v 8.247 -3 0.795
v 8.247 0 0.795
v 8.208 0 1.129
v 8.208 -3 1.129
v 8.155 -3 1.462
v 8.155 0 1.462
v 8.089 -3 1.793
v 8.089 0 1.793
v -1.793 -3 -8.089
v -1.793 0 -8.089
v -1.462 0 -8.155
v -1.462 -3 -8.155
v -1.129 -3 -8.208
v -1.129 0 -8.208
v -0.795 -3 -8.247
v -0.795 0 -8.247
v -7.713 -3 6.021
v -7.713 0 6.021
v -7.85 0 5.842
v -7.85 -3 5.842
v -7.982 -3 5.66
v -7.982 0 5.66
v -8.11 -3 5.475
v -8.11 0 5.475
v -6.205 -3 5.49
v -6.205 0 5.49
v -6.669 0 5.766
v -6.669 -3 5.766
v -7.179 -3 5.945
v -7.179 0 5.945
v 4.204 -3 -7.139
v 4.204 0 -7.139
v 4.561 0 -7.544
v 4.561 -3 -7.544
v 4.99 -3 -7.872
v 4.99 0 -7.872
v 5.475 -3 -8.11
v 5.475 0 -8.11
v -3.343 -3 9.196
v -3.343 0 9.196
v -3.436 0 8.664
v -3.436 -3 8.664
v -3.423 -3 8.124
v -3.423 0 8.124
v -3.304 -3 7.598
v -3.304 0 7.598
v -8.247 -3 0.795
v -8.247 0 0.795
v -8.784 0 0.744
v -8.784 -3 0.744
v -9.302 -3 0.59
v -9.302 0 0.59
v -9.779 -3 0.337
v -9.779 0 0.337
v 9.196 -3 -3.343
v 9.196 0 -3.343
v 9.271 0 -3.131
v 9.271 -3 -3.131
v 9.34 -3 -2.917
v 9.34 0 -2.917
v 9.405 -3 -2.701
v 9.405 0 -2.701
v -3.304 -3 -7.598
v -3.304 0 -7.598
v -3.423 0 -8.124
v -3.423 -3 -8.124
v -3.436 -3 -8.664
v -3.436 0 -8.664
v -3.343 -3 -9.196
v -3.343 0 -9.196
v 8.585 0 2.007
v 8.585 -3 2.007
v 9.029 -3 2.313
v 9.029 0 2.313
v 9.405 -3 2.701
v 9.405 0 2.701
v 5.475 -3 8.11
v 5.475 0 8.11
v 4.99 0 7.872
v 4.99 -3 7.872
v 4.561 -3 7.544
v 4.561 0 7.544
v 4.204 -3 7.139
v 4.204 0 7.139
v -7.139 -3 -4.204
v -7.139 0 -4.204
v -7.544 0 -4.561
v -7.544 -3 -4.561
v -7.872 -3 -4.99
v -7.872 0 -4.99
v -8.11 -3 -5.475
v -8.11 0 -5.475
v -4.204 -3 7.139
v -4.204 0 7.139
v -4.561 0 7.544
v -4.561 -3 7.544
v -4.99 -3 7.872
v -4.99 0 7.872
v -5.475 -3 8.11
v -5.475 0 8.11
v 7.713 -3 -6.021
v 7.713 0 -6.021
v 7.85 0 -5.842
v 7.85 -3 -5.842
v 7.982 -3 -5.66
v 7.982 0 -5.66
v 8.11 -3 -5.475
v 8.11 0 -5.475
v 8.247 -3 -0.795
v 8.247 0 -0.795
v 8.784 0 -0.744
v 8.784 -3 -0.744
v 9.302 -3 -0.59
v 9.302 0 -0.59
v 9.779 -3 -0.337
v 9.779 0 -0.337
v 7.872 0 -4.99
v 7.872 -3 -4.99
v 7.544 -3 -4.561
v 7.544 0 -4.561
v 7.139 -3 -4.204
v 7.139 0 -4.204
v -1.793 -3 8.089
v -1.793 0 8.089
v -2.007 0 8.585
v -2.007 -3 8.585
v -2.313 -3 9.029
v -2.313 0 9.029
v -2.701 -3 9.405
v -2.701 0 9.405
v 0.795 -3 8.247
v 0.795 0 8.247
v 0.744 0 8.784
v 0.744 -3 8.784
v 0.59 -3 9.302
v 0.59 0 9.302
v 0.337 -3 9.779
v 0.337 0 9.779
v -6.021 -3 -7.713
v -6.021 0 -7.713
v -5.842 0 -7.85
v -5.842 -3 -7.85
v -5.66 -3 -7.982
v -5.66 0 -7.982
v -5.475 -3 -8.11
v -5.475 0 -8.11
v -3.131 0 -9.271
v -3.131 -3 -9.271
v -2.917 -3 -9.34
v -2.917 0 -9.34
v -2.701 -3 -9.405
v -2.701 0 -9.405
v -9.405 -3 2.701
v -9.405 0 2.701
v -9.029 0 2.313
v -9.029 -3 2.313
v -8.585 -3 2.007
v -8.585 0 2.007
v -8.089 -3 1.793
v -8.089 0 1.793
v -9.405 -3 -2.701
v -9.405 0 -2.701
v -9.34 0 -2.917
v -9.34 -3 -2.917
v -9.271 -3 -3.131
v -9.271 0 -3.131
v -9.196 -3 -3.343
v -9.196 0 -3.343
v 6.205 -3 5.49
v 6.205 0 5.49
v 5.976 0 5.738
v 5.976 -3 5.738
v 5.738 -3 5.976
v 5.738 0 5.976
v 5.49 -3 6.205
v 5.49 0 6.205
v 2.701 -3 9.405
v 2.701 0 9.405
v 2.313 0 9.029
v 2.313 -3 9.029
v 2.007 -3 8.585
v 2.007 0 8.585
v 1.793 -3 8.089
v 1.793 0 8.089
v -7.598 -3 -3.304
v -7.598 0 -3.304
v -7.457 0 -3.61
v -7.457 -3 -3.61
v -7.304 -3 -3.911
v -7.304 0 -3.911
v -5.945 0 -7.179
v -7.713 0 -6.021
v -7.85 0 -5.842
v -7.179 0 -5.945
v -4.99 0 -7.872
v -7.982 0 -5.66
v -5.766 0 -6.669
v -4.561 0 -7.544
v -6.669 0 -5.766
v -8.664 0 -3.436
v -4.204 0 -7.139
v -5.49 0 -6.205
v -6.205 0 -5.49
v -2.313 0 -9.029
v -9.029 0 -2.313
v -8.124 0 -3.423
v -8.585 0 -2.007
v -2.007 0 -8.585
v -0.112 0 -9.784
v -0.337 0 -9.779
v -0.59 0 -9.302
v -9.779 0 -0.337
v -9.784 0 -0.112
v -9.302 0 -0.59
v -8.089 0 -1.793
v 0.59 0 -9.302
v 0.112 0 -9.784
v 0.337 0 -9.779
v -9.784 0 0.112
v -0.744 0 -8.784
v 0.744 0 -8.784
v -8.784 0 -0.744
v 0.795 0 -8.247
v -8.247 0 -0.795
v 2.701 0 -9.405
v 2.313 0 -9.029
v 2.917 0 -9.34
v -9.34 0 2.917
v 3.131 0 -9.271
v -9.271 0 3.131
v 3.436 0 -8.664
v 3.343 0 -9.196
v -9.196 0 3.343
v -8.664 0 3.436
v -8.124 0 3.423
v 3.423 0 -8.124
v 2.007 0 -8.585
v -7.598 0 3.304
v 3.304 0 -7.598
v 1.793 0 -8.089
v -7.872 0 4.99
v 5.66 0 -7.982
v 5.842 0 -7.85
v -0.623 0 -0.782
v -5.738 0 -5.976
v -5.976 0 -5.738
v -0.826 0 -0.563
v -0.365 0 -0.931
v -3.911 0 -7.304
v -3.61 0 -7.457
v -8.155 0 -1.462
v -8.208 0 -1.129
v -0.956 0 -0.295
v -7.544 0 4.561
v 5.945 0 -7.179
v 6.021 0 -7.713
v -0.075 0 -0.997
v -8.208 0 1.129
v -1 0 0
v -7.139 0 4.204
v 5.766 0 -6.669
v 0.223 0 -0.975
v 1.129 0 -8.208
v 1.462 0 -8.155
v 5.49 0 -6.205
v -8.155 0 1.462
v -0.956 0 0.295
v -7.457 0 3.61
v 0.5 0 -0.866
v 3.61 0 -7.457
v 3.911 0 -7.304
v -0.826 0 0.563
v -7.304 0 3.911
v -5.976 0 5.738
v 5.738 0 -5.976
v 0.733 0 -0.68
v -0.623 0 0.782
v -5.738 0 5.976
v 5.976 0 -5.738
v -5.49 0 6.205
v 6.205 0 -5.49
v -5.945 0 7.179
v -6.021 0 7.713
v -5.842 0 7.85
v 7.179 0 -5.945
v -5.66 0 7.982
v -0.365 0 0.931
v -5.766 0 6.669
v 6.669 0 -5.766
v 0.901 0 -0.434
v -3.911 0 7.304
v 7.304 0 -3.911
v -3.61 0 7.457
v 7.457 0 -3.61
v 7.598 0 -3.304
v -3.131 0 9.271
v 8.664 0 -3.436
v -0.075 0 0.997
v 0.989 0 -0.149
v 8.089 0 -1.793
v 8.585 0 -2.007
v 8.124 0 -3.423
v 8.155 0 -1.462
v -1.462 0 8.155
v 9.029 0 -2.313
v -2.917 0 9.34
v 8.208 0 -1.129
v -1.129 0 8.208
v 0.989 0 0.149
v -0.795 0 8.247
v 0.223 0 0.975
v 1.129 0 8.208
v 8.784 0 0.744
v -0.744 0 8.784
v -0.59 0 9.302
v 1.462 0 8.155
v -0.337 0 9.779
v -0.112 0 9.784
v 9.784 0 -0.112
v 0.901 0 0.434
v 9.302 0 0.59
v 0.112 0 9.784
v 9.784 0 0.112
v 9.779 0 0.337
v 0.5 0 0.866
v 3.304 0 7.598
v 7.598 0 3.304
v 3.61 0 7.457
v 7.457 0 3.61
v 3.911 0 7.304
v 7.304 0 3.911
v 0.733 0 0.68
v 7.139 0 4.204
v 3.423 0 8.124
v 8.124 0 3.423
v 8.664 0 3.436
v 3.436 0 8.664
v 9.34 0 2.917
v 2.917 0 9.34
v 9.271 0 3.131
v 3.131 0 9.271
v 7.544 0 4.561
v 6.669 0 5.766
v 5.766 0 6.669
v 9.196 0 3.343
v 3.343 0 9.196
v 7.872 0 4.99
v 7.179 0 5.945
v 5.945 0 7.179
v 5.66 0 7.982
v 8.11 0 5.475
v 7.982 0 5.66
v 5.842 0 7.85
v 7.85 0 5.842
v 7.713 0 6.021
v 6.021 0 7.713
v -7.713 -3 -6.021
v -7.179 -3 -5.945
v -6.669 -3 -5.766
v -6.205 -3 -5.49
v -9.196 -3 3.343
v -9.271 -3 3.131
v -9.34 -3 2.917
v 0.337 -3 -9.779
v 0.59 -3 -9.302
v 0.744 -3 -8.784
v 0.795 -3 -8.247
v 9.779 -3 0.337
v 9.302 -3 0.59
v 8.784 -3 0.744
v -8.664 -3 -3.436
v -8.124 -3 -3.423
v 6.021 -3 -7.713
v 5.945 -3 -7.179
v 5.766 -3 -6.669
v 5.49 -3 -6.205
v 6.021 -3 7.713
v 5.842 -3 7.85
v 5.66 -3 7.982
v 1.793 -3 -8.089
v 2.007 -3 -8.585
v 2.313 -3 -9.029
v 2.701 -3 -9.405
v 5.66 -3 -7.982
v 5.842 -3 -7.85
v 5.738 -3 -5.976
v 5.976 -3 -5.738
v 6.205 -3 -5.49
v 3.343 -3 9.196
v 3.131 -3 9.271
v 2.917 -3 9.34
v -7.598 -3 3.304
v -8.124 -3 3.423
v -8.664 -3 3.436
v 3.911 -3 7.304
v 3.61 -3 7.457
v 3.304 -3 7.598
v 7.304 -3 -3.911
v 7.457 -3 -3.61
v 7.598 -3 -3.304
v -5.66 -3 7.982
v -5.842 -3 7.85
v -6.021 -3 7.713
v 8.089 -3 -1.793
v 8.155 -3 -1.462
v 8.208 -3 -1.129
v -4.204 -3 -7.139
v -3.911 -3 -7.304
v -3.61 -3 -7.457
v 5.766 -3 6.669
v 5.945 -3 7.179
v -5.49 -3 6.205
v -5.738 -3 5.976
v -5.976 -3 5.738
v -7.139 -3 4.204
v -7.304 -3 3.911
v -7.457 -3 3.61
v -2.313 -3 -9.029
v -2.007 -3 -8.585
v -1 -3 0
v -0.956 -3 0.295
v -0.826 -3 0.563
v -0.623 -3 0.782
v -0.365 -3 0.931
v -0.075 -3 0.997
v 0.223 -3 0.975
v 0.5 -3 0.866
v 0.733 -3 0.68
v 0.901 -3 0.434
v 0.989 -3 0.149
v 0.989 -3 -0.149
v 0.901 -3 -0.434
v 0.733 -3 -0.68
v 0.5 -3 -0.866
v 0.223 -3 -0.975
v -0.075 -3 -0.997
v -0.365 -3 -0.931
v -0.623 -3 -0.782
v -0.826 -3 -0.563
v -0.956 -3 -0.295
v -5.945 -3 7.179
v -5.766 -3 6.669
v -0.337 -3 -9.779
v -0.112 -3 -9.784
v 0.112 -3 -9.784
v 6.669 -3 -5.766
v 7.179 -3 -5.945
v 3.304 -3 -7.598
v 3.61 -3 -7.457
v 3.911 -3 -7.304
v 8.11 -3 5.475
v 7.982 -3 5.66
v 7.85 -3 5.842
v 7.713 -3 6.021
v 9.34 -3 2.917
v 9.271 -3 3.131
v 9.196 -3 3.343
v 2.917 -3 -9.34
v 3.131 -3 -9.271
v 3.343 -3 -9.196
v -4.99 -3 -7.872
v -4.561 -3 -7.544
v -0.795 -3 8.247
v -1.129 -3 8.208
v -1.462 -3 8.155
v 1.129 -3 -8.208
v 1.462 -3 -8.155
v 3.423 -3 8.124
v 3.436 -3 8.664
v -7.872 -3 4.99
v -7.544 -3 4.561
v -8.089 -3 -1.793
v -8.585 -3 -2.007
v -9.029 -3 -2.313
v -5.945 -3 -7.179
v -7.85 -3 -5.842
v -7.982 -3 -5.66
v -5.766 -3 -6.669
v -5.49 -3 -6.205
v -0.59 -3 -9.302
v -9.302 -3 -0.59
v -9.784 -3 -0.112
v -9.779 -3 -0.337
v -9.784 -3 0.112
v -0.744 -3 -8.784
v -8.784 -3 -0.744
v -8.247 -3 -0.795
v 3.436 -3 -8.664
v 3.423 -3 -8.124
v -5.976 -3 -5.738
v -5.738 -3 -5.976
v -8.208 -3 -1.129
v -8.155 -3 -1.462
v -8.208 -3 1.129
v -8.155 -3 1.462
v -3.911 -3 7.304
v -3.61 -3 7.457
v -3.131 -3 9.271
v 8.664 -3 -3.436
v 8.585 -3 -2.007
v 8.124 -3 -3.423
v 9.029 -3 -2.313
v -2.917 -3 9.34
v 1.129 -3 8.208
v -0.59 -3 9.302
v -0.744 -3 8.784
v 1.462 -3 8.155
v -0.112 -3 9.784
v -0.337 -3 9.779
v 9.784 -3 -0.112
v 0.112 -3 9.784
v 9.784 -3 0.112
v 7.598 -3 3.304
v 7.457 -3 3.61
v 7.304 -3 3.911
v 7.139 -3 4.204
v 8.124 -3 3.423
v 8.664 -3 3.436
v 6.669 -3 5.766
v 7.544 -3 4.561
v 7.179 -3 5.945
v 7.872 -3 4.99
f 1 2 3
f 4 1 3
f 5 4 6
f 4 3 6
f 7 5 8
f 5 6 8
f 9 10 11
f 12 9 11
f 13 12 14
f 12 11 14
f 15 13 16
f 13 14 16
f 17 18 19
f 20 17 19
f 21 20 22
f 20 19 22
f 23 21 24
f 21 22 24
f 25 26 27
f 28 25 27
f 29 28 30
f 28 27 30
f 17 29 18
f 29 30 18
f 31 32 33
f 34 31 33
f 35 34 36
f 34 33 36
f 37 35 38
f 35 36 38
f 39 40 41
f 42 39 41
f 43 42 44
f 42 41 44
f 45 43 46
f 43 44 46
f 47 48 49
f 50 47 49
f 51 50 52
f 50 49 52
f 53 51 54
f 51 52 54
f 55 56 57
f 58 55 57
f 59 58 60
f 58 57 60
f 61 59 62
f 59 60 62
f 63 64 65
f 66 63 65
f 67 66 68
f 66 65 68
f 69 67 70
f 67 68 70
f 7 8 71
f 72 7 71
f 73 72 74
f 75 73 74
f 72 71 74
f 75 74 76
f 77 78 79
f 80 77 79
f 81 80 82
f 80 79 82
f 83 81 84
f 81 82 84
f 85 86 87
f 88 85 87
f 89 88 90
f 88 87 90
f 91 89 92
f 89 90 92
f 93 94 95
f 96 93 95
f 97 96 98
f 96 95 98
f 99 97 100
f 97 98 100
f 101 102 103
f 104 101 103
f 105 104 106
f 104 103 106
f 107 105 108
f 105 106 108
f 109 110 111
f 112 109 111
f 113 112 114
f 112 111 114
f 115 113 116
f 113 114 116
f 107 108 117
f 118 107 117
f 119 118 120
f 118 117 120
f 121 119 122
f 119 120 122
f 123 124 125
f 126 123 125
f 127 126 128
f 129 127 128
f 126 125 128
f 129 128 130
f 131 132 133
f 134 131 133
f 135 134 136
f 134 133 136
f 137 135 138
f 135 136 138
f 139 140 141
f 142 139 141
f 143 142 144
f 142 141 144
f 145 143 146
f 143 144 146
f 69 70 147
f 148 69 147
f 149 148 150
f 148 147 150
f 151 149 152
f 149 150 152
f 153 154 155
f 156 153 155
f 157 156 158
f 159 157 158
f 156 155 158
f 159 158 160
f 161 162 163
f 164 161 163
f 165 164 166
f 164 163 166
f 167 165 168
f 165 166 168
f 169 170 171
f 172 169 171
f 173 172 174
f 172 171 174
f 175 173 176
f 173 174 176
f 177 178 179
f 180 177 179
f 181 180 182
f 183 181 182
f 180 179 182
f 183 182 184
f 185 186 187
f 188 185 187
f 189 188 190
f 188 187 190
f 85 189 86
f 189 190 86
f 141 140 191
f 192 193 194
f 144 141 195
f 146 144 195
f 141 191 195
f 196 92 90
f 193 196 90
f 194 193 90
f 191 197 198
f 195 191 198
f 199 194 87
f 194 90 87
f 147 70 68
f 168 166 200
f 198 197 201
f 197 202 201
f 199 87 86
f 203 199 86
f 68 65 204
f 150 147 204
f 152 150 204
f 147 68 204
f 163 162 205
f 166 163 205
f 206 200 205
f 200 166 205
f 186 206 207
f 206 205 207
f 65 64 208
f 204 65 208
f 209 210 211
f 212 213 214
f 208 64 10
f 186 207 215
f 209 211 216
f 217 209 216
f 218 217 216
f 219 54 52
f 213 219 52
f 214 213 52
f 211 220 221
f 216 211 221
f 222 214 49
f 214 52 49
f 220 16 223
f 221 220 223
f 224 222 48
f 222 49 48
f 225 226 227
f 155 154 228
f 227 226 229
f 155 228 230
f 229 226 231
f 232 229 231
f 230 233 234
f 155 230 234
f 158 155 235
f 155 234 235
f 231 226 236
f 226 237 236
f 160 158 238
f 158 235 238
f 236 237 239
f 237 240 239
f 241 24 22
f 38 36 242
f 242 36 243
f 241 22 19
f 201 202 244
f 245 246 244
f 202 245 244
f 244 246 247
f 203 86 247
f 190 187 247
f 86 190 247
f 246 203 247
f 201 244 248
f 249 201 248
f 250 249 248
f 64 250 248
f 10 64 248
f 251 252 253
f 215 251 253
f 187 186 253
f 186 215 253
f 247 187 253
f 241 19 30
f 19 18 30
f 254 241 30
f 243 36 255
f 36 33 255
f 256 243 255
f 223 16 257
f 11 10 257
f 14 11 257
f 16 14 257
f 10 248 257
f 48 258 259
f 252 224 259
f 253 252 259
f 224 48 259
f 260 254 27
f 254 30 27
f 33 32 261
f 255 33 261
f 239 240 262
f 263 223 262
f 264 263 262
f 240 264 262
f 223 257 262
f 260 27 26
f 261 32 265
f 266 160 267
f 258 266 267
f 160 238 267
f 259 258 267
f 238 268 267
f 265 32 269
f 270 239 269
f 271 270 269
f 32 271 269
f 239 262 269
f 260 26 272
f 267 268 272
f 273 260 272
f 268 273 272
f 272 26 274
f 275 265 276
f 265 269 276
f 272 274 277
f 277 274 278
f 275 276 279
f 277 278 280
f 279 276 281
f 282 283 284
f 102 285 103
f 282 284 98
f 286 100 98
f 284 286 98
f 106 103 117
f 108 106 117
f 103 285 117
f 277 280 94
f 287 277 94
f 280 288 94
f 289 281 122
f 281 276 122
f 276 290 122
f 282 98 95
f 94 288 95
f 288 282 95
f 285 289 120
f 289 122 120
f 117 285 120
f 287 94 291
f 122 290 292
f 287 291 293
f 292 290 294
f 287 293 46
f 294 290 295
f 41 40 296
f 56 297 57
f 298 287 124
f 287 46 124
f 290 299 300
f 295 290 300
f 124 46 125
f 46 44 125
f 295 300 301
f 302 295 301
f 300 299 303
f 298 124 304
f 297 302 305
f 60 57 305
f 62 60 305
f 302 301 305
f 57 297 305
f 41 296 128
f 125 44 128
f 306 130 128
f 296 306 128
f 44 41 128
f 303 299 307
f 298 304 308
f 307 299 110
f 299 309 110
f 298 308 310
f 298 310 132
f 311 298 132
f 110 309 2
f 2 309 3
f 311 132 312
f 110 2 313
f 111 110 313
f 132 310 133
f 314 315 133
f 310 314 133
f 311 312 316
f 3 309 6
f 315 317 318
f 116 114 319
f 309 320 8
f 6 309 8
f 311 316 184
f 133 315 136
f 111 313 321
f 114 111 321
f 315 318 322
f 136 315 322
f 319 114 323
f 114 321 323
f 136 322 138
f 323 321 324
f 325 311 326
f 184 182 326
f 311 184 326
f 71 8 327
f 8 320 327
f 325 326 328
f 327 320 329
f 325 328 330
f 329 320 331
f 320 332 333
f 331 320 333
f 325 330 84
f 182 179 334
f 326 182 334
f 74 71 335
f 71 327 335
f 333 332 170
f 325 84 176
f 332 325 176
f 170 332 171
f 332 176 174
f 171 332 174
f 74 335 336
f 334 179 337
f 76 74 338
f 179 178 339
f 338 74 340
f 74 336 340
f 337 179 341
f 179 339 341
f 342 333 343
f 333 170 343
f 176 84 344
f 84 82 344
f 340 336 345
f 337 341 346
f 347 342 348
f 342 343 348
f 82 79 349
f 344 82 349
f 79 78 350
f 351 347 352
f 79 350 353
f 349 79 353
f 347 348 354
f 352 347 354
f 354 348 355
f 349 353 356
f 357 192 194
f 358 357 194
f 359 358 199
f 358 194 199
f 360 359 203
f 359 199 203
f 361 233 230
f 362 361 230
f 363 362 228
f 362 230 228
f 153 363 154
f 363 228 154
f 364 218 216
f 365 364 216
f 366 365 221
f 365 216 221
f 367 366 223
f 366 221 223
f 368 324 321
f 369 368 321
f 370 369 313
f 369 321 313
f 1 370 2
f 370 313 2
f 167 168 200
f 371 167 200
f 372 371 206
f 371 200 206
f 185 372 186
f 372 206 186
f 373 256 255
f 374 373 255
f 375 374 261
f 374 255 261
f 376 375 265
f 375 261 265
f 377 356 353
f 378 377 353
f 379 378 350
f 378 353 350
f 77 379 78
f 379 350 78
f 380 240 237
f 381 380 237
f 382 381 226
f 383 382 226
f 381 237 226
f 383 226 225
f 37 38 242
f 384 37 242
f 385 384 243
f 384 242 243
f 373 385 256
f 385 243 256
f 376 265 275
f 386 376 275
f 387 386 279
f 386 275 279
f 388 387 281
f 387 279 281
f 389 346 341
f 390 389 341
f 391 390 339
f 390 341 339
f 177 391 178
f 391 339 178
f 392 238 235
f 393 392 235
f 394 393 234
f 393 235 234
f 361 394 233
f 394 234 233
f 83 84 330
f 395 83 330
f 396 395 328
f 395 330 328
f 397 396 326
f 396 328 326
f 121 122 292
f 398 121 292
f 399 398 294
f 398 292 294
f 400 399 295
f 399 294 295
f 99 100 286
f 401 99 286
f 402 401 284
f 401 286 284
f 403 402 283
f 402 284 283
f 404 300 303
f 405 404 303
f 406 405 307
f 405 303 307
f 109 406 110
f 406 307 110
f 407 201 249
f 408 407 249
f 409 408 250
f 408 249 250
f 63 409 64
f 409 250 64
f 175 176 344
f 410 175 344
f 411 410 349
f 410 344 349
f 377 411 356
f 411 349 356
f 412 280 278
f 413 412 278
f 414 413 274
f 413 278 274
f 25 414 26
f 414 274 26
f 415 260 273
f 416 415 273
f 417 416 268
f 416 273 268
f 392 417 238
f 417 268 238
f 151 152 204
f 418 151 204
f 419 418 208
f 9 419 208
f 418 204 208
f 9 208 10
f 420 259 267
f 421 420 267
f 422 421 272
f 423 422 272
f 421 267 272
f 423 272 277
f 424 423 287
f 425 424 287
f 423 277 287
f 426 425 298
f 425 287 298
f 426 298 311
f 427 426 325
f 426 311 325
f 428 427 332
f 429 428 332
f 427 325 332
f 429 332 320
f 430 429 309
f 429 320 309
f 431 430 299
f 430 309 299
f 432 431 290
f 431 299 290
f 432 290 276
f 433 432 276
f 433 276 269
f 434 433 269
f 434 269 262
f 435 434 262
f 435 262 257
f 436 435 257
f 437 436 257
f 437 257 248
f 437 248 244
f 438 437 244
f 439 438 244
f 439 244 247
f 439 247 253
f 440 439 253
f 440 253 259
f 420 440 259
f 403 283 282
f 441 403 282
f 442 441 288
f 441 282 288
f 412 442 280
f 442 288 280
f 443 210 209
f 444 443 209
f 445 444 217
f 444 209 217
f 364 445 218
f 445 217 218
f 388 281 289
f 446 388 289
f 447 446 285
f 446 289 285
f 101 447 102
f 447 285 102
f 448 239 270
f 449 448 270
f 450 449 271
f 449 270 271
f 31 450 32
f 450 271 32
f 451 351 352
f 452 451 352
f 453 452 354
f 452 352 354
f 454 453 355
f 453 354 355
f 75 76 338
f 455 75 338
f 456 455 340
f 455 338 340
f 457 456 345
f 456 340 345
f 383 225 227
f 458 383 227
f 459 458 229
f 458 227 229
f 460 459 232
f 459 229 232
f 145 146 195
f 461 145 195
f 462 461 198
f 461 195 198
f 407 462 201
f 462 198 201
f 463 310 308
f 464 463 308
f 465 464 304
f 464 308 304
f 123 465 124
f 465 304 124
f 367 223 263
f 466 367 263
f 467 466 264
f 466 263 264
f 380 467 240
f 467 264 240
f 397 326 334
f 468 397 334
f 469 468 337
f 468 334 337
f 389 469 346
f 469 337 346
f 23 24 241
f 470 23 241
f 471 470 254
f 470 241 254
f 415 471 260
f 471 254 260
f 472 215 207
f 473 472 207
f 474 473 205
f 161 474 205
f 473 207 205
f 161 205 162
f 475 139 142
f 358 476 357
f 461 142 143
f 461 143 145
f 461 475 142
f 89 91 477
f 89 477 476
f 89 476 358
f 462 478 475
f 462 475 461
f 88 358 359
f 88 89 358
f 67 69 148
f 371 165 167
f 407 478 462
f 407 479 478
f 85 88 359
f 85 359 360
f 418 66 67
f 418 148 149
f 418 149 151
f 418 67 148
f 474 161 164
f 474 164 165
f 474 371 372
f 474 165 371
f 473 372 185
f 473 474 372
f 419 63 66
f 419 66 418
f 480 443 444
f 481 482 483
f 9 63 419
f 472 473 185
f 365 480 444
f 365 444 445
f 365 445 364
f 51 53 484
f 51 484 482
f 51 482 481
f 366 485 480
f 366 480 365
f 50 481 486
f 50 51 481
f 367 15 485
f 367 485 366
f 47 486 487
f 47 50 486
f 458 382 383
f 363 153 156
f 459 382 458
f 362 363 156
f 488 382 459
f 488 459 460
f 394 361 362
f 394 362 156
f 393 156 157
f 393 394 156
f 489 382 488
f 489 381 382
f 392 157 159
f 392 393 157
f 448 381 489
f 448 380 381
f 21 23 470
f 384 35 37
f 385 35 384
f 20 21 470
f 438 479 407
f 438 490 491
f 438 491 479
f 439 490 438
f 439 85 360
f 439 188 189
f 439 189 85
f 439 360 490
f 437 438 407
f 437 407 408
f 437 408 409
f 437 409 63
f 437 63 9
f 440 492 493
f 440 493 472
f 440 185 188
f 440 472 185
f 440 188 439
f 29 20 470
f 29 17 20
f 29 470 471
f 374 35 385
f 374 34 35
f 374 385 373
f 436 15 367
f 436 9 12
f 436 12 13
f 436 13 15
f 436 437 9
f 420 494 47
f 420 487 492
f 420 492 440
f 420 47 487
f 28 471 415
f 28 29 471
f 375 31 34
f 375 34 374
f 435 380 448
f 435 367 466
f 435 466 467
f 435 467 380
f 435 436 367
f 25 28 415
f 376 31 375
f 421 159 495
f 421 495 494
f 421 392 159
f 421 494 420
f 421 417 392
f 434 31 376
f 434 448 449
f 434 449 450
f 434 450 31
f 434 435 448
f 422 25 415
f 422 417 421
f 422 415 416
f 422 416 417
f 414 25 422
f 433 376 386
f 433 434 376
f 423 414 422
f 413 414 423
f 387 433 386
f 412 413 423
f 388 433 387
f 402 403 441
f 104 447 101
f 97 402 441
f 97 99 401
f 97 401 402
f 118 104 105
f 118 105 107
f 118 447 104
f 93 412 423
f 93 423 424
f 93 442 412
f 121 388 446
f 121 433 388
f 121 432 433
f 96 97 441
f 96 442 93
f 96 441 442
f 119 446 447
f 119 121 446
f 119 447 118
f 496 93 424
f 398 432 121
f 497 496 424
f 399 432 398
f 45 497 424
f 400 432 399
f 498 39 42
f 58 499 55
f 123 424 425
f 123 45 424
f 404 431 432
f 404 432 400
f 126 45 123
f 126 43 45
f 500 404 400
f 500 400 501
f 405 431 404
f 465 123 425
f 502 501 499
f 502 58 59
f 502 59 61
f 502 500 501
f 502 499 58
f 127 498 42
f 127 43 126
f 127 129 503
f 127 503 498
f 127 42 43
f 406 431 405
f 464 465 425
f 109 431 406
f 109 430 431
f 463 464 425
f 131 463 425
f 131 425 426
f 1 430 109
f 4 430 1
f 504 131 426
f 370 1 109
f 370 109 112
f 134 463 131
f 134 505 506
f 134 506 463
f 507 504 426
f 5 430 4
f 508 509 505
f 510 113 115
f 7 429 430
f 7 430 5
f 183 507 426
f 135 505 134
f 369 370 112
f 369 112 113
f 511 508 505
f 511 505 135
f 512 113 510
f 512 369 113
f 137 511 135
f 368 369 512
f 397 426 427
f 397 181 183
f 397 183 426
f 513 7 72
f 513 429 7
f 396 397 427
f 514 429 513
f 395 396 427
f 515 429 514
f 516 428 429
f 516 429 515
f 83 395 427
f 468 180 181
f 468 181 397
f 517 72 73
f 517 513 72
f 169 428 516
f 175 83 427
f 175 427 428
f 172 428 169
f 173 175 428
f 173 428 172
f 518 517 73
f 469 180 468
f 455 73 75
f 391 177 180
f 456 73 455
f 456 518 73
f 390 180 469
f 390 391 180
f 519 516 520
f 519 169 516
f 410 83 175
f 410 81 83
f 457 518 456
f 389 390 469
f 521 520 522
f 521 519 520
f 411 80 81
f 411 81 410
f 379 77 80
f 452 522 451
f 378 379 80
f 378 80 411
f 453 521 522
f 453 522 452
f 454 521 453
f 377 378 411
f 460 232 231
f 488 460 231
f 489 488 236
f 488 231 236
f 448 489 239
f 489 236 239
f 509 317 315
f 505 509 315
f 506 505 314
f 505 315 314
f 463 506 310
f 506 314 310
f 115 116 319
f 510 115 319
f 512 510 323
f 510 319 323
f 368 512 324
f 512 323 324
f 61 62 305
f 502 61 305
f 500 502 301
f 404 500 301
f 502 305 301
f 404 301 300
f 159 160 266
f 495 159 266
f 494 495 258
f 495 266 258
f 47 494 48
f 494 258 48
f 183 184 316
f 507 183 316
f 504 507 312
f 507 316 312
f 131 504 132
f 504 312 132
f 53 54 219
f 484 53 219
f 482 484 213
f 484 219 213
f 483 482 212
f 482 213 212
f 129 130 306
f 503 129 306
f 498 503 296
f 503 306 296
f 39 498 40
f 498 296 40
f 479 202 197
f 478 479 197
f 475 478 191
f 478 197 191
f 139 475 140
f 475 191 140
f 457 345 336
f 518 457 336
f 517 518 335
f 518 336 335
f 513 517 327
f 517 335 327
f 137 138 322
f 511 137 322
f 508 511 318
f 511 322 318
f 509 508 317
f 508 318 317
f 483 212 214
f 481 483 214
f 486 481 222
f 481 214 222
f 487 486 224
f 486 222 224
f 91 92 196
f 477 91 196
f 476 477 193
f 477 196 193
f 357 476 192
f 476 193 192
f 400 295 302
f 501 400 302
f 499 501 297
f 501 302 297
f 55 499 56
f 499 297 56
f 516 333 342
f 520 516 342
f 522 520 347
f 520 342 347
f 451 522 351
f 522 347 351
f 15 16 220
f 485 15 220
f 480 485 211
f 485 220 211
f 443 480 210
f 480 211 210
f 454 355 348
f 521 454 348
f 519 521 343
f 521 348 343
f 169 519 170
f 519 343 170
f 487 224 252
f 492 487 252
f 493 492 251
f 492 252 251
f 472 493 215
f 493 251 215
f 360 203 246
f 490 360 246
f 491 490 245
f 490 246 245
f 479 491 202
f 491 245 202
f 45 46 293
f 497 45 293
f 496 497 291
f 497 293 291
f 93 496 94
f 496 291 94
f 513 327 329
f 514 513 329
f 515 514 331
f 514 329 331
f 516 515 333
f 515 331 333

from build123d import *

# Parameters (mm, degrees)
F1_DEPTH = 3
F2_R     = 1
F3_DEPTH = 3.001


with BuildPart() as f1:
    # F0 (on Front) → F1 (new body)
    with BuildSketch(Plane.XZ):
        with BuildLine():
            ThreePointArc((8.24679, -0.794783), (8.275442, -0.397851), (8.285, 0))
            ThreePointArc((8.285, 0), (8.275442, 0.397851), (8.24679, 0.794783))
            ThreePointArc((8.24679, 0.794783), (8.182998, 1.29606), (8.088765, 1.792514))
            ThreePointArc((8.088765, 1.792514), (7.879503, 2.560206), (7.597562, 3.304282))
            ThreePointArc((7.597562, 3.304282), (7.381989, 3.761311), (7.138955, 4.204348))
            ThreePointArc((7.138955, 4.204348), (6.702706, 4.869801), (6.204631, 5.490335))
            ThreePointArc((6.204631, 5.490335), (5.85838, 5.85838), (5.490335, 6.204631))
            ThreePointArc((5.490335, 6.204631), (4.869801, 6.702706), (4.204348, 7.138955))
            ThreePointArc((4.204348, 7.138955), (3.761311, 7.381989), (3.304282, 7.597562))
            ThreePointArc((3.304282, 7.597562), (2.560206, 7.879503), (1.792514, 8.088765))
            ThreePointArc((1.792514, 8.088765), (1.29606, 8.182998), (0.794783, 8.24679))
            ThreePointArc((0.794783, 8.24679), (0, 8.285), (-0.794783, 8.24679))
            ThreePointArc((-0.794783, 8.24679), (-1.29606, 8.182998), (-1.792514, 8.088765))
            ThreePointArc((-1.792514, 8.088765), (-2.560206, 7.879503), (-3.304282, 7.597562))
            ThreePointArc((-3.304282, 7.597562), (-3.761311, 7.381989), (-4.204348, 7.138955))
            ThreePointArc((-4.204348, 7.138955), (-4.869801, 6.702706), (-5.490335, 6.204631))
            ThreePointArc((-5.490335, 6.204631), (-5.85838, 5.85838), (-6.204631, 5.490335))
            ThreePointArc((-6.204631, 5.490335), (-6.702706, 4.869801), (-7.138955, 4.204348))
            ThreePointArc((-7.138955, 4.204348), (-7.381989, 3.761311), (-7.597562, 3.304282))
            ThreePointArc((-7.597562, 3.304282), (-7.879503, 2.560206), (-8.088765, 1.792514))
            ThreePointArc((-8.088765, 1.792514), (-8.182998, 1.29606), (-8.24679, 0.794783))
            ThreePointArc((-8.24679, 0.794783), (-8.285, 0), (-8.24679, -0.794783))
            ThreePointArc((-8.24679, -0.794783), (-8.182998, -1.29606), (-8.088765, -1.792514))
            ThreePointArc((-8.088765, -1.792514), (-7.879503, -2.560206), (-7.597562, -3.304282))
            ThreePointArc((-7.597562, -3.304282), (-7.381989, -3.761311), (-7.138955, -4.204348))
            ThreePointArc((-7.138955, -4.204348), (-6.702706, -4.869801), (-6.204631, -5.490335))
            ThreePointArc((-6.204631, -5.490335), (-5.85838, -5.85838), (-5.490335, -6.204631))
            ThreePointArc((-5.490335, -6.204631), (-4.869801, -6.702706), (-4.204348, -7.138955))
            ThreePointArc((-4.204348, -7.138955), (-3.761311, -7.381989), (-3.304282, -7.597562))
            ThreePointArc((-3.304282, -7.597562), (-2.560206, -7.879503), (-1.792514, -8.088765))
            ThreePointArc((-1.792514, -8.088765), (-1.29606, -8.182998), (-0.794783, -8.24679))
            ThreePointArc((-0.794783, -8.24679), (0, -8.285), (0.794783, -8.24679))
            ThreePointArc((0.794783, -8.24679), (1.29606, -8.182998), (1.792514, -8.088765))
            ThreePointArc((1.792514, -8.088765), (2.560206, -7.879503), (3.304282, -7.597562))
            ThreePointArc((3.304282, -7.597562), (3.761311, -7.381989), (4.204348, -7.138955))
            ThreePointArc((4.204348, -7.138955), (4.869801, -6.702706), (5.490335, -6.204631))
            ThreePointArc((5.490335, -6.204631), (5.85838, -5.85838), (6.204631, -5.490335))
            ThreePointArc((6.204631, -5.490335), (6.702706, -4.869801), (7.138955, -4.204348))
            ThreePointArc((7.138955, -4.204348), (7.381989, -3.761311), (7.597562, -3.304282))
            ThreePointArc((7.597562, -3.304282), (7.879503, -2.560206), (8.088765, -1.792514))
            ThreePointArc((8.088765, -1.792514), (8.182998, -1.29606), (8.24679, -0.794783))
        make_face()
        with BuildLine():
            ThreePointArc((8.24679, 0.794783), (8.275442, 0.397851), (8.285, 0))
            ThreePointArc((8.285, 0), (8.275442, -0.397851), (8.24679, -0.794783))
            ThreePointArc((8.24679, -0.794783), (9.046963, -0.679903), (9.779182, -0.33737))
            ThreePointArc((9.779182, -0.33737), (9.785, 0), (9.779182, 0.33737))
            ThreePointArc((9.779182, 0.33737), (9.046963, 0.679903), (8.24679, 0.794783))
        make_face()
        with BuildLine():
            ThreePointArc((7.597562, 3.304282), (7.879503, 2.560206), (8.088765, 1.792514))
            ThreePointArc((8.088765, 1.792514), (8.814274, 2.149039), (9.404808, 2.701076))
            ThreePointArc((9.404808, 2.701076), (9.306088, 3.023731), (9.196302, 3.342791))
            ThreePointArc((9.196302, 3.342791), (8.394071, 3.442291), (7.597562, 3.304282))
        make_face()
        with BuildLine():
            ThreePointArc((9.404808, -2.701076), (8.814274, -2.149039), (8.088765, -1.792514))
            ThreePointArc((8.088765, -1.792514), (7.879503, -2.560206), (7.597562, -3.304282))
            ThreePointArc((7.597562, -3.304282), (8.394071, -3.442291), (9.196302, -3.342791))
            ThreePointArc((9.196302, -3.342791), (9.306088, -3.023731), (9.404808, -2.701076))
        make_face()
        with BuildLine():
            ThreePointArc((6.204631, 5.490335), (6.702706, 4.869801), (7.138955, 4.204348))
            ThreePointArc((7.138955, 4.204348), (7.718783, 4.767618), (8.109826, 5.475121))
            ThreePointArc((8.109826, 5.475121), (7.916231, 5.751479), (7.713224, 6.020997))
            ThreePointArc((7.713224, 6.020997), (6.91951, 5.867724), (6.204631, 5.490335))
        make_face()
        with BuildLine():
            ThreePointArc((8.109826, -5.475121), (7.718783, -4.767618), (7.138955, -4.204348))
            ThreePointArc((7.138955, -4.204348), (6.702706, -4.869801), (6.204631, -5.490335))
            ThreePointArc((6.204631, -5.490335), (6.91951, -5.867724), (7.713224, -6.020997))
            ThreePointArc((7.713224, -6.020997), (7.916231, -5.751479), (8.109826, -5.475121))
        make_face()
        with BuildLine():
            ThreePointArc((4.204348, 7.138955), (4.869801, 6.702706), (5.490335, 6.204631))
            ThreePointArc((5.490335, 6.204631), (5.867724, 6.91951), (6.020997, 7.713224))
            ThreePointArc((6.020997, 7.713224), (5.751479, 7.916231), (5.475121, 8.109826))
            ThreePointArc((5.475121, 8.109826), (4.767618, 7.718783), (4.204348, 7.138955))
        make_face()
        with BuildLine():
            ThreePointArc((6.020997, -7.713224), (5.867724, -6.91951), (5.490335, -6.204631))
            ThreePointArc((5.490335, -6.204631), (4.869801, -6.702706), (4.204348, -7.138955))
            ThreePointArc((4.204348, -7.138955), (4.767618, -7.718783), (5.475121, -8.109826))
            ThreePointArc((5.475121, -8.109826), (5.751479, -7.916231), (6.020997, -7.713224))
        make_face()
        with BuildLine():
            ThreePointArc((1.792514, 8.088765), (2.560206, 7.879503), (3.304282, 7.597562))
            ThreePointArc((3.304282, 7.597562), (3.442291, 8.394071), (3.342791, 9.196302))
            ThreePointArc((3.342791, 9.196302), (3.023731, 9.306088), (2.701076, 9.404808))
            ThreePointArc((2.701076, 9.404808), (2.149039, 8.814274), (1.792514, 8.088765))
        make_face()
        with BuildLine():
            ThreePointArc((3.342791, -9.196302), (3.442291, -8.394071), (3.304282, -7.597562))
            ThreePointArc((3.304282, -7.597562), (2.560206, -7.879503), (1.792514, -8.088765))
            ThreePointArc((1.792514, -8.088765), (2.149039, -8.814274), (2.701076, -9.404808))
            ThreePointArc((2.701076, -9.404808), (3.023731, -9.306088), (3.342791, -9.196302))
        make_face()
        with BuildLine():
            ThreePointArc((-0.794783, 8.24679), (0, 8.285), (0.794783, 8.24679))
            ThreePointArc((0.794783, 8.24679), (0.679903, 9.046963), (0.33737, 9.779182))
            ThreePointArc((0.33737, 9.779182), (0, 9.785), (-0.33737, 9.779182))
            ThreePointArc((-0.33737, 9.779182), (-0.679903, 9.046963), (-0.794783, 8.24679))
        make_face()
        with BuildLine():
            ThreePointArc((0.33737, -9.779182), (0.679903, -9.046963), (0.794783, -8.24679))
            ThreePointArc((0.794783, -8.24679), (0, -8.285), (-0.794783, -8.24679))
            ThreePointArc((-0.794783, -8.24679), (-0.679903, -9.046963), (-0.33737, -9.779182))
            ThreePointArc((-0.33737, -9.779182), (0, -9.785), (0.33737, -9.779182))
        make_face()
        with BuildLine():
            ThreePointArc((-3.304282, 7.597562), (-2.560206, 7.879503), (-1.792514, 8.088765))
            ThreePointArc((-1.792514, 8.088765), (-2.149039, 8.814274), (-2.701076, 9.404808))
            ThreePointArc((-2.701076, 9.404808), (-3.023731, 9.306088), (-3.342791, 9.196302))
            ThreePointArc((-3.342791, 9.196302), (-3.442291, 8.394071), (-3.304282, 7.597562))
        make_face()
        with BuildLine():
            ThreePointArc((-2.701076, -9.404808), (-2.149039, -8.814274), (-1.792514, -8.088765))
            ThreePointArc((-1.792514, -8.088765), (-2.560206, -7.879503), (-3.304282, -7.597562))
            ThreePointArc((-3.304282, -7.597562), (-3.442291, -8.394071), (-3.342791, -9.196302))
            ThreePointArc((-3.342791, -9.196302), (-3.023731, -9.306088), (-2.701076, -9.404808))
        make_face()
        with BuildLine():
            ThreePointArc((-5.490335, 6.204631), (-4.869801, 6.702706), (-4.204348, 7.138955))
            ThreePointArc((-4.204348, 7.138955), (-4.767618, 7.718783), (-5.475121, 8.109826))
            ThreePointArc((-5.475121, 8.109826), (-5.751479, 7.916231), (-6.020997, 7.713224))
            ThreePointArc((-6.020997, 7.713224), (-5.867724, 6.91951), (-5.490335, 6.204631))
        make_face()
        with BuildLine():
            ThreePointArc((-5.475121, -8.109826), (-4.767618, -7.718783), (-4.204348, -7.138955))
            ThreePointArc((-4.204348, -7.138955), (-4.869801, -6.702706), (-5.490335, -6.204631))
            ThreePointArc((-5.490335, -6.204631), (-5.867724, -6.91951), (-6.020997, -7.713224))
            ThreePointArc((-6.020997, -7.713224), (-5.751479, -7.916231), (-5.475121, -8.109826))
        make_face()
        with BuildLine():
            ThreePointArc((-7.138955, 4.204348), (-6.702706, 4.869801), (-6.204631, 5.490335))
            ThreePointArc((-6.204631, 5.490335), (-6.91951, 5.867724), (-7.713224, 6.020997))
            ThreePointArc((-7.713224, 6.020997), (-7.916231, 5.751479), (-8.109826, 5.475121))
            ThreePointArc((-8.109826, 5.475121), (-7.718783, 4.767618), (-7.138955, 4.204348))
        make_face()
        with BuildLine():
            ThreePointArc((-7.713224, -6.020997), (-6.91951, -5.867724), (-6.204631, -5.490335))
            ThreePointArc((-6.204631, -5.490335), (-6.702706, -4.869801), (-7.138955, -4.204348))
            ThreePointArc((-7.138955, -4.204348), (-7.718783, -4.767618), (-8.109826, -5.475121))
            ThreePointArc((-8.109826, -5.475121), (-7.916231, -5.751479), (-7.713224, -6.020997))
        make_face()
        with BuildLine():
            ThreePointArc((-8.088765, 1.792514), (-7.879503, 2.560206), (-7.597562, 3.304282))
            ThreePointArc((-7.597562, 3.304282), (-8.394071, 3.442291), (-9.196302, 3.342791))
            ThreePointArc((-9.196302, 3.342791), (-9.306088, 3.023731), (-9.404808, 2.701076))
            ThreePointArc((-9.404808, 2.701076), (-8.814274, 2.149039), (-8.088765, 1.792514))
        make_face()
        with BuildLine():
            ThreePointArc((-9.196302, -3.342791), (-8.394071, -3.442291), (-7.597562, -3.304282))
            ThreePointArc((-7.597562, -3.304282), (-7.879503, -2.560206), (-8.088765, -1.792514))
            ThreePointArc((-8.088765, -1.792514), (-8.814274, -2.149039), (-9.404808, -2.701076))
            ThreePointArc((-9.404808, -2.701076), (-9.306088, -3.023731), (-9.196302, -3.342791))
        make_face()
        with BuildLine():
            ThreePointArc((-8.24679, -0.794783), (-8.285, 0), (-8.24679, 0.794783))
            ThreePointArc((-8.24679, 0.794783), (-9.046963, 0.679903), (-9.779182, 0.33737))
            ThreePointArc((-9.779182, 0.33737), (-9.785, 0), (-9.779182, -0.33737))
            ThreePointArc((-9.779182, -0.33737), (-9.046963, -0.679903), (-8.24679, -0.794783))
        make_face()
    extrude(amount=F1_DEPTH)

    # F2 (on face) → F3 (cut, through all)
    with BuildSketch(Plane(origin=(0, 0, 0), x_dir=(-1, 0, 0), z_dir=(0, 1, 0))):
        Circle(F2_R)
    extrude(amount=-F3_DEPTH, mode=Mode.SUBTRACT)


with BuildPart() as f4_1:
    # F4: copy of F1
    add(f1.part)


solid = f1.part
